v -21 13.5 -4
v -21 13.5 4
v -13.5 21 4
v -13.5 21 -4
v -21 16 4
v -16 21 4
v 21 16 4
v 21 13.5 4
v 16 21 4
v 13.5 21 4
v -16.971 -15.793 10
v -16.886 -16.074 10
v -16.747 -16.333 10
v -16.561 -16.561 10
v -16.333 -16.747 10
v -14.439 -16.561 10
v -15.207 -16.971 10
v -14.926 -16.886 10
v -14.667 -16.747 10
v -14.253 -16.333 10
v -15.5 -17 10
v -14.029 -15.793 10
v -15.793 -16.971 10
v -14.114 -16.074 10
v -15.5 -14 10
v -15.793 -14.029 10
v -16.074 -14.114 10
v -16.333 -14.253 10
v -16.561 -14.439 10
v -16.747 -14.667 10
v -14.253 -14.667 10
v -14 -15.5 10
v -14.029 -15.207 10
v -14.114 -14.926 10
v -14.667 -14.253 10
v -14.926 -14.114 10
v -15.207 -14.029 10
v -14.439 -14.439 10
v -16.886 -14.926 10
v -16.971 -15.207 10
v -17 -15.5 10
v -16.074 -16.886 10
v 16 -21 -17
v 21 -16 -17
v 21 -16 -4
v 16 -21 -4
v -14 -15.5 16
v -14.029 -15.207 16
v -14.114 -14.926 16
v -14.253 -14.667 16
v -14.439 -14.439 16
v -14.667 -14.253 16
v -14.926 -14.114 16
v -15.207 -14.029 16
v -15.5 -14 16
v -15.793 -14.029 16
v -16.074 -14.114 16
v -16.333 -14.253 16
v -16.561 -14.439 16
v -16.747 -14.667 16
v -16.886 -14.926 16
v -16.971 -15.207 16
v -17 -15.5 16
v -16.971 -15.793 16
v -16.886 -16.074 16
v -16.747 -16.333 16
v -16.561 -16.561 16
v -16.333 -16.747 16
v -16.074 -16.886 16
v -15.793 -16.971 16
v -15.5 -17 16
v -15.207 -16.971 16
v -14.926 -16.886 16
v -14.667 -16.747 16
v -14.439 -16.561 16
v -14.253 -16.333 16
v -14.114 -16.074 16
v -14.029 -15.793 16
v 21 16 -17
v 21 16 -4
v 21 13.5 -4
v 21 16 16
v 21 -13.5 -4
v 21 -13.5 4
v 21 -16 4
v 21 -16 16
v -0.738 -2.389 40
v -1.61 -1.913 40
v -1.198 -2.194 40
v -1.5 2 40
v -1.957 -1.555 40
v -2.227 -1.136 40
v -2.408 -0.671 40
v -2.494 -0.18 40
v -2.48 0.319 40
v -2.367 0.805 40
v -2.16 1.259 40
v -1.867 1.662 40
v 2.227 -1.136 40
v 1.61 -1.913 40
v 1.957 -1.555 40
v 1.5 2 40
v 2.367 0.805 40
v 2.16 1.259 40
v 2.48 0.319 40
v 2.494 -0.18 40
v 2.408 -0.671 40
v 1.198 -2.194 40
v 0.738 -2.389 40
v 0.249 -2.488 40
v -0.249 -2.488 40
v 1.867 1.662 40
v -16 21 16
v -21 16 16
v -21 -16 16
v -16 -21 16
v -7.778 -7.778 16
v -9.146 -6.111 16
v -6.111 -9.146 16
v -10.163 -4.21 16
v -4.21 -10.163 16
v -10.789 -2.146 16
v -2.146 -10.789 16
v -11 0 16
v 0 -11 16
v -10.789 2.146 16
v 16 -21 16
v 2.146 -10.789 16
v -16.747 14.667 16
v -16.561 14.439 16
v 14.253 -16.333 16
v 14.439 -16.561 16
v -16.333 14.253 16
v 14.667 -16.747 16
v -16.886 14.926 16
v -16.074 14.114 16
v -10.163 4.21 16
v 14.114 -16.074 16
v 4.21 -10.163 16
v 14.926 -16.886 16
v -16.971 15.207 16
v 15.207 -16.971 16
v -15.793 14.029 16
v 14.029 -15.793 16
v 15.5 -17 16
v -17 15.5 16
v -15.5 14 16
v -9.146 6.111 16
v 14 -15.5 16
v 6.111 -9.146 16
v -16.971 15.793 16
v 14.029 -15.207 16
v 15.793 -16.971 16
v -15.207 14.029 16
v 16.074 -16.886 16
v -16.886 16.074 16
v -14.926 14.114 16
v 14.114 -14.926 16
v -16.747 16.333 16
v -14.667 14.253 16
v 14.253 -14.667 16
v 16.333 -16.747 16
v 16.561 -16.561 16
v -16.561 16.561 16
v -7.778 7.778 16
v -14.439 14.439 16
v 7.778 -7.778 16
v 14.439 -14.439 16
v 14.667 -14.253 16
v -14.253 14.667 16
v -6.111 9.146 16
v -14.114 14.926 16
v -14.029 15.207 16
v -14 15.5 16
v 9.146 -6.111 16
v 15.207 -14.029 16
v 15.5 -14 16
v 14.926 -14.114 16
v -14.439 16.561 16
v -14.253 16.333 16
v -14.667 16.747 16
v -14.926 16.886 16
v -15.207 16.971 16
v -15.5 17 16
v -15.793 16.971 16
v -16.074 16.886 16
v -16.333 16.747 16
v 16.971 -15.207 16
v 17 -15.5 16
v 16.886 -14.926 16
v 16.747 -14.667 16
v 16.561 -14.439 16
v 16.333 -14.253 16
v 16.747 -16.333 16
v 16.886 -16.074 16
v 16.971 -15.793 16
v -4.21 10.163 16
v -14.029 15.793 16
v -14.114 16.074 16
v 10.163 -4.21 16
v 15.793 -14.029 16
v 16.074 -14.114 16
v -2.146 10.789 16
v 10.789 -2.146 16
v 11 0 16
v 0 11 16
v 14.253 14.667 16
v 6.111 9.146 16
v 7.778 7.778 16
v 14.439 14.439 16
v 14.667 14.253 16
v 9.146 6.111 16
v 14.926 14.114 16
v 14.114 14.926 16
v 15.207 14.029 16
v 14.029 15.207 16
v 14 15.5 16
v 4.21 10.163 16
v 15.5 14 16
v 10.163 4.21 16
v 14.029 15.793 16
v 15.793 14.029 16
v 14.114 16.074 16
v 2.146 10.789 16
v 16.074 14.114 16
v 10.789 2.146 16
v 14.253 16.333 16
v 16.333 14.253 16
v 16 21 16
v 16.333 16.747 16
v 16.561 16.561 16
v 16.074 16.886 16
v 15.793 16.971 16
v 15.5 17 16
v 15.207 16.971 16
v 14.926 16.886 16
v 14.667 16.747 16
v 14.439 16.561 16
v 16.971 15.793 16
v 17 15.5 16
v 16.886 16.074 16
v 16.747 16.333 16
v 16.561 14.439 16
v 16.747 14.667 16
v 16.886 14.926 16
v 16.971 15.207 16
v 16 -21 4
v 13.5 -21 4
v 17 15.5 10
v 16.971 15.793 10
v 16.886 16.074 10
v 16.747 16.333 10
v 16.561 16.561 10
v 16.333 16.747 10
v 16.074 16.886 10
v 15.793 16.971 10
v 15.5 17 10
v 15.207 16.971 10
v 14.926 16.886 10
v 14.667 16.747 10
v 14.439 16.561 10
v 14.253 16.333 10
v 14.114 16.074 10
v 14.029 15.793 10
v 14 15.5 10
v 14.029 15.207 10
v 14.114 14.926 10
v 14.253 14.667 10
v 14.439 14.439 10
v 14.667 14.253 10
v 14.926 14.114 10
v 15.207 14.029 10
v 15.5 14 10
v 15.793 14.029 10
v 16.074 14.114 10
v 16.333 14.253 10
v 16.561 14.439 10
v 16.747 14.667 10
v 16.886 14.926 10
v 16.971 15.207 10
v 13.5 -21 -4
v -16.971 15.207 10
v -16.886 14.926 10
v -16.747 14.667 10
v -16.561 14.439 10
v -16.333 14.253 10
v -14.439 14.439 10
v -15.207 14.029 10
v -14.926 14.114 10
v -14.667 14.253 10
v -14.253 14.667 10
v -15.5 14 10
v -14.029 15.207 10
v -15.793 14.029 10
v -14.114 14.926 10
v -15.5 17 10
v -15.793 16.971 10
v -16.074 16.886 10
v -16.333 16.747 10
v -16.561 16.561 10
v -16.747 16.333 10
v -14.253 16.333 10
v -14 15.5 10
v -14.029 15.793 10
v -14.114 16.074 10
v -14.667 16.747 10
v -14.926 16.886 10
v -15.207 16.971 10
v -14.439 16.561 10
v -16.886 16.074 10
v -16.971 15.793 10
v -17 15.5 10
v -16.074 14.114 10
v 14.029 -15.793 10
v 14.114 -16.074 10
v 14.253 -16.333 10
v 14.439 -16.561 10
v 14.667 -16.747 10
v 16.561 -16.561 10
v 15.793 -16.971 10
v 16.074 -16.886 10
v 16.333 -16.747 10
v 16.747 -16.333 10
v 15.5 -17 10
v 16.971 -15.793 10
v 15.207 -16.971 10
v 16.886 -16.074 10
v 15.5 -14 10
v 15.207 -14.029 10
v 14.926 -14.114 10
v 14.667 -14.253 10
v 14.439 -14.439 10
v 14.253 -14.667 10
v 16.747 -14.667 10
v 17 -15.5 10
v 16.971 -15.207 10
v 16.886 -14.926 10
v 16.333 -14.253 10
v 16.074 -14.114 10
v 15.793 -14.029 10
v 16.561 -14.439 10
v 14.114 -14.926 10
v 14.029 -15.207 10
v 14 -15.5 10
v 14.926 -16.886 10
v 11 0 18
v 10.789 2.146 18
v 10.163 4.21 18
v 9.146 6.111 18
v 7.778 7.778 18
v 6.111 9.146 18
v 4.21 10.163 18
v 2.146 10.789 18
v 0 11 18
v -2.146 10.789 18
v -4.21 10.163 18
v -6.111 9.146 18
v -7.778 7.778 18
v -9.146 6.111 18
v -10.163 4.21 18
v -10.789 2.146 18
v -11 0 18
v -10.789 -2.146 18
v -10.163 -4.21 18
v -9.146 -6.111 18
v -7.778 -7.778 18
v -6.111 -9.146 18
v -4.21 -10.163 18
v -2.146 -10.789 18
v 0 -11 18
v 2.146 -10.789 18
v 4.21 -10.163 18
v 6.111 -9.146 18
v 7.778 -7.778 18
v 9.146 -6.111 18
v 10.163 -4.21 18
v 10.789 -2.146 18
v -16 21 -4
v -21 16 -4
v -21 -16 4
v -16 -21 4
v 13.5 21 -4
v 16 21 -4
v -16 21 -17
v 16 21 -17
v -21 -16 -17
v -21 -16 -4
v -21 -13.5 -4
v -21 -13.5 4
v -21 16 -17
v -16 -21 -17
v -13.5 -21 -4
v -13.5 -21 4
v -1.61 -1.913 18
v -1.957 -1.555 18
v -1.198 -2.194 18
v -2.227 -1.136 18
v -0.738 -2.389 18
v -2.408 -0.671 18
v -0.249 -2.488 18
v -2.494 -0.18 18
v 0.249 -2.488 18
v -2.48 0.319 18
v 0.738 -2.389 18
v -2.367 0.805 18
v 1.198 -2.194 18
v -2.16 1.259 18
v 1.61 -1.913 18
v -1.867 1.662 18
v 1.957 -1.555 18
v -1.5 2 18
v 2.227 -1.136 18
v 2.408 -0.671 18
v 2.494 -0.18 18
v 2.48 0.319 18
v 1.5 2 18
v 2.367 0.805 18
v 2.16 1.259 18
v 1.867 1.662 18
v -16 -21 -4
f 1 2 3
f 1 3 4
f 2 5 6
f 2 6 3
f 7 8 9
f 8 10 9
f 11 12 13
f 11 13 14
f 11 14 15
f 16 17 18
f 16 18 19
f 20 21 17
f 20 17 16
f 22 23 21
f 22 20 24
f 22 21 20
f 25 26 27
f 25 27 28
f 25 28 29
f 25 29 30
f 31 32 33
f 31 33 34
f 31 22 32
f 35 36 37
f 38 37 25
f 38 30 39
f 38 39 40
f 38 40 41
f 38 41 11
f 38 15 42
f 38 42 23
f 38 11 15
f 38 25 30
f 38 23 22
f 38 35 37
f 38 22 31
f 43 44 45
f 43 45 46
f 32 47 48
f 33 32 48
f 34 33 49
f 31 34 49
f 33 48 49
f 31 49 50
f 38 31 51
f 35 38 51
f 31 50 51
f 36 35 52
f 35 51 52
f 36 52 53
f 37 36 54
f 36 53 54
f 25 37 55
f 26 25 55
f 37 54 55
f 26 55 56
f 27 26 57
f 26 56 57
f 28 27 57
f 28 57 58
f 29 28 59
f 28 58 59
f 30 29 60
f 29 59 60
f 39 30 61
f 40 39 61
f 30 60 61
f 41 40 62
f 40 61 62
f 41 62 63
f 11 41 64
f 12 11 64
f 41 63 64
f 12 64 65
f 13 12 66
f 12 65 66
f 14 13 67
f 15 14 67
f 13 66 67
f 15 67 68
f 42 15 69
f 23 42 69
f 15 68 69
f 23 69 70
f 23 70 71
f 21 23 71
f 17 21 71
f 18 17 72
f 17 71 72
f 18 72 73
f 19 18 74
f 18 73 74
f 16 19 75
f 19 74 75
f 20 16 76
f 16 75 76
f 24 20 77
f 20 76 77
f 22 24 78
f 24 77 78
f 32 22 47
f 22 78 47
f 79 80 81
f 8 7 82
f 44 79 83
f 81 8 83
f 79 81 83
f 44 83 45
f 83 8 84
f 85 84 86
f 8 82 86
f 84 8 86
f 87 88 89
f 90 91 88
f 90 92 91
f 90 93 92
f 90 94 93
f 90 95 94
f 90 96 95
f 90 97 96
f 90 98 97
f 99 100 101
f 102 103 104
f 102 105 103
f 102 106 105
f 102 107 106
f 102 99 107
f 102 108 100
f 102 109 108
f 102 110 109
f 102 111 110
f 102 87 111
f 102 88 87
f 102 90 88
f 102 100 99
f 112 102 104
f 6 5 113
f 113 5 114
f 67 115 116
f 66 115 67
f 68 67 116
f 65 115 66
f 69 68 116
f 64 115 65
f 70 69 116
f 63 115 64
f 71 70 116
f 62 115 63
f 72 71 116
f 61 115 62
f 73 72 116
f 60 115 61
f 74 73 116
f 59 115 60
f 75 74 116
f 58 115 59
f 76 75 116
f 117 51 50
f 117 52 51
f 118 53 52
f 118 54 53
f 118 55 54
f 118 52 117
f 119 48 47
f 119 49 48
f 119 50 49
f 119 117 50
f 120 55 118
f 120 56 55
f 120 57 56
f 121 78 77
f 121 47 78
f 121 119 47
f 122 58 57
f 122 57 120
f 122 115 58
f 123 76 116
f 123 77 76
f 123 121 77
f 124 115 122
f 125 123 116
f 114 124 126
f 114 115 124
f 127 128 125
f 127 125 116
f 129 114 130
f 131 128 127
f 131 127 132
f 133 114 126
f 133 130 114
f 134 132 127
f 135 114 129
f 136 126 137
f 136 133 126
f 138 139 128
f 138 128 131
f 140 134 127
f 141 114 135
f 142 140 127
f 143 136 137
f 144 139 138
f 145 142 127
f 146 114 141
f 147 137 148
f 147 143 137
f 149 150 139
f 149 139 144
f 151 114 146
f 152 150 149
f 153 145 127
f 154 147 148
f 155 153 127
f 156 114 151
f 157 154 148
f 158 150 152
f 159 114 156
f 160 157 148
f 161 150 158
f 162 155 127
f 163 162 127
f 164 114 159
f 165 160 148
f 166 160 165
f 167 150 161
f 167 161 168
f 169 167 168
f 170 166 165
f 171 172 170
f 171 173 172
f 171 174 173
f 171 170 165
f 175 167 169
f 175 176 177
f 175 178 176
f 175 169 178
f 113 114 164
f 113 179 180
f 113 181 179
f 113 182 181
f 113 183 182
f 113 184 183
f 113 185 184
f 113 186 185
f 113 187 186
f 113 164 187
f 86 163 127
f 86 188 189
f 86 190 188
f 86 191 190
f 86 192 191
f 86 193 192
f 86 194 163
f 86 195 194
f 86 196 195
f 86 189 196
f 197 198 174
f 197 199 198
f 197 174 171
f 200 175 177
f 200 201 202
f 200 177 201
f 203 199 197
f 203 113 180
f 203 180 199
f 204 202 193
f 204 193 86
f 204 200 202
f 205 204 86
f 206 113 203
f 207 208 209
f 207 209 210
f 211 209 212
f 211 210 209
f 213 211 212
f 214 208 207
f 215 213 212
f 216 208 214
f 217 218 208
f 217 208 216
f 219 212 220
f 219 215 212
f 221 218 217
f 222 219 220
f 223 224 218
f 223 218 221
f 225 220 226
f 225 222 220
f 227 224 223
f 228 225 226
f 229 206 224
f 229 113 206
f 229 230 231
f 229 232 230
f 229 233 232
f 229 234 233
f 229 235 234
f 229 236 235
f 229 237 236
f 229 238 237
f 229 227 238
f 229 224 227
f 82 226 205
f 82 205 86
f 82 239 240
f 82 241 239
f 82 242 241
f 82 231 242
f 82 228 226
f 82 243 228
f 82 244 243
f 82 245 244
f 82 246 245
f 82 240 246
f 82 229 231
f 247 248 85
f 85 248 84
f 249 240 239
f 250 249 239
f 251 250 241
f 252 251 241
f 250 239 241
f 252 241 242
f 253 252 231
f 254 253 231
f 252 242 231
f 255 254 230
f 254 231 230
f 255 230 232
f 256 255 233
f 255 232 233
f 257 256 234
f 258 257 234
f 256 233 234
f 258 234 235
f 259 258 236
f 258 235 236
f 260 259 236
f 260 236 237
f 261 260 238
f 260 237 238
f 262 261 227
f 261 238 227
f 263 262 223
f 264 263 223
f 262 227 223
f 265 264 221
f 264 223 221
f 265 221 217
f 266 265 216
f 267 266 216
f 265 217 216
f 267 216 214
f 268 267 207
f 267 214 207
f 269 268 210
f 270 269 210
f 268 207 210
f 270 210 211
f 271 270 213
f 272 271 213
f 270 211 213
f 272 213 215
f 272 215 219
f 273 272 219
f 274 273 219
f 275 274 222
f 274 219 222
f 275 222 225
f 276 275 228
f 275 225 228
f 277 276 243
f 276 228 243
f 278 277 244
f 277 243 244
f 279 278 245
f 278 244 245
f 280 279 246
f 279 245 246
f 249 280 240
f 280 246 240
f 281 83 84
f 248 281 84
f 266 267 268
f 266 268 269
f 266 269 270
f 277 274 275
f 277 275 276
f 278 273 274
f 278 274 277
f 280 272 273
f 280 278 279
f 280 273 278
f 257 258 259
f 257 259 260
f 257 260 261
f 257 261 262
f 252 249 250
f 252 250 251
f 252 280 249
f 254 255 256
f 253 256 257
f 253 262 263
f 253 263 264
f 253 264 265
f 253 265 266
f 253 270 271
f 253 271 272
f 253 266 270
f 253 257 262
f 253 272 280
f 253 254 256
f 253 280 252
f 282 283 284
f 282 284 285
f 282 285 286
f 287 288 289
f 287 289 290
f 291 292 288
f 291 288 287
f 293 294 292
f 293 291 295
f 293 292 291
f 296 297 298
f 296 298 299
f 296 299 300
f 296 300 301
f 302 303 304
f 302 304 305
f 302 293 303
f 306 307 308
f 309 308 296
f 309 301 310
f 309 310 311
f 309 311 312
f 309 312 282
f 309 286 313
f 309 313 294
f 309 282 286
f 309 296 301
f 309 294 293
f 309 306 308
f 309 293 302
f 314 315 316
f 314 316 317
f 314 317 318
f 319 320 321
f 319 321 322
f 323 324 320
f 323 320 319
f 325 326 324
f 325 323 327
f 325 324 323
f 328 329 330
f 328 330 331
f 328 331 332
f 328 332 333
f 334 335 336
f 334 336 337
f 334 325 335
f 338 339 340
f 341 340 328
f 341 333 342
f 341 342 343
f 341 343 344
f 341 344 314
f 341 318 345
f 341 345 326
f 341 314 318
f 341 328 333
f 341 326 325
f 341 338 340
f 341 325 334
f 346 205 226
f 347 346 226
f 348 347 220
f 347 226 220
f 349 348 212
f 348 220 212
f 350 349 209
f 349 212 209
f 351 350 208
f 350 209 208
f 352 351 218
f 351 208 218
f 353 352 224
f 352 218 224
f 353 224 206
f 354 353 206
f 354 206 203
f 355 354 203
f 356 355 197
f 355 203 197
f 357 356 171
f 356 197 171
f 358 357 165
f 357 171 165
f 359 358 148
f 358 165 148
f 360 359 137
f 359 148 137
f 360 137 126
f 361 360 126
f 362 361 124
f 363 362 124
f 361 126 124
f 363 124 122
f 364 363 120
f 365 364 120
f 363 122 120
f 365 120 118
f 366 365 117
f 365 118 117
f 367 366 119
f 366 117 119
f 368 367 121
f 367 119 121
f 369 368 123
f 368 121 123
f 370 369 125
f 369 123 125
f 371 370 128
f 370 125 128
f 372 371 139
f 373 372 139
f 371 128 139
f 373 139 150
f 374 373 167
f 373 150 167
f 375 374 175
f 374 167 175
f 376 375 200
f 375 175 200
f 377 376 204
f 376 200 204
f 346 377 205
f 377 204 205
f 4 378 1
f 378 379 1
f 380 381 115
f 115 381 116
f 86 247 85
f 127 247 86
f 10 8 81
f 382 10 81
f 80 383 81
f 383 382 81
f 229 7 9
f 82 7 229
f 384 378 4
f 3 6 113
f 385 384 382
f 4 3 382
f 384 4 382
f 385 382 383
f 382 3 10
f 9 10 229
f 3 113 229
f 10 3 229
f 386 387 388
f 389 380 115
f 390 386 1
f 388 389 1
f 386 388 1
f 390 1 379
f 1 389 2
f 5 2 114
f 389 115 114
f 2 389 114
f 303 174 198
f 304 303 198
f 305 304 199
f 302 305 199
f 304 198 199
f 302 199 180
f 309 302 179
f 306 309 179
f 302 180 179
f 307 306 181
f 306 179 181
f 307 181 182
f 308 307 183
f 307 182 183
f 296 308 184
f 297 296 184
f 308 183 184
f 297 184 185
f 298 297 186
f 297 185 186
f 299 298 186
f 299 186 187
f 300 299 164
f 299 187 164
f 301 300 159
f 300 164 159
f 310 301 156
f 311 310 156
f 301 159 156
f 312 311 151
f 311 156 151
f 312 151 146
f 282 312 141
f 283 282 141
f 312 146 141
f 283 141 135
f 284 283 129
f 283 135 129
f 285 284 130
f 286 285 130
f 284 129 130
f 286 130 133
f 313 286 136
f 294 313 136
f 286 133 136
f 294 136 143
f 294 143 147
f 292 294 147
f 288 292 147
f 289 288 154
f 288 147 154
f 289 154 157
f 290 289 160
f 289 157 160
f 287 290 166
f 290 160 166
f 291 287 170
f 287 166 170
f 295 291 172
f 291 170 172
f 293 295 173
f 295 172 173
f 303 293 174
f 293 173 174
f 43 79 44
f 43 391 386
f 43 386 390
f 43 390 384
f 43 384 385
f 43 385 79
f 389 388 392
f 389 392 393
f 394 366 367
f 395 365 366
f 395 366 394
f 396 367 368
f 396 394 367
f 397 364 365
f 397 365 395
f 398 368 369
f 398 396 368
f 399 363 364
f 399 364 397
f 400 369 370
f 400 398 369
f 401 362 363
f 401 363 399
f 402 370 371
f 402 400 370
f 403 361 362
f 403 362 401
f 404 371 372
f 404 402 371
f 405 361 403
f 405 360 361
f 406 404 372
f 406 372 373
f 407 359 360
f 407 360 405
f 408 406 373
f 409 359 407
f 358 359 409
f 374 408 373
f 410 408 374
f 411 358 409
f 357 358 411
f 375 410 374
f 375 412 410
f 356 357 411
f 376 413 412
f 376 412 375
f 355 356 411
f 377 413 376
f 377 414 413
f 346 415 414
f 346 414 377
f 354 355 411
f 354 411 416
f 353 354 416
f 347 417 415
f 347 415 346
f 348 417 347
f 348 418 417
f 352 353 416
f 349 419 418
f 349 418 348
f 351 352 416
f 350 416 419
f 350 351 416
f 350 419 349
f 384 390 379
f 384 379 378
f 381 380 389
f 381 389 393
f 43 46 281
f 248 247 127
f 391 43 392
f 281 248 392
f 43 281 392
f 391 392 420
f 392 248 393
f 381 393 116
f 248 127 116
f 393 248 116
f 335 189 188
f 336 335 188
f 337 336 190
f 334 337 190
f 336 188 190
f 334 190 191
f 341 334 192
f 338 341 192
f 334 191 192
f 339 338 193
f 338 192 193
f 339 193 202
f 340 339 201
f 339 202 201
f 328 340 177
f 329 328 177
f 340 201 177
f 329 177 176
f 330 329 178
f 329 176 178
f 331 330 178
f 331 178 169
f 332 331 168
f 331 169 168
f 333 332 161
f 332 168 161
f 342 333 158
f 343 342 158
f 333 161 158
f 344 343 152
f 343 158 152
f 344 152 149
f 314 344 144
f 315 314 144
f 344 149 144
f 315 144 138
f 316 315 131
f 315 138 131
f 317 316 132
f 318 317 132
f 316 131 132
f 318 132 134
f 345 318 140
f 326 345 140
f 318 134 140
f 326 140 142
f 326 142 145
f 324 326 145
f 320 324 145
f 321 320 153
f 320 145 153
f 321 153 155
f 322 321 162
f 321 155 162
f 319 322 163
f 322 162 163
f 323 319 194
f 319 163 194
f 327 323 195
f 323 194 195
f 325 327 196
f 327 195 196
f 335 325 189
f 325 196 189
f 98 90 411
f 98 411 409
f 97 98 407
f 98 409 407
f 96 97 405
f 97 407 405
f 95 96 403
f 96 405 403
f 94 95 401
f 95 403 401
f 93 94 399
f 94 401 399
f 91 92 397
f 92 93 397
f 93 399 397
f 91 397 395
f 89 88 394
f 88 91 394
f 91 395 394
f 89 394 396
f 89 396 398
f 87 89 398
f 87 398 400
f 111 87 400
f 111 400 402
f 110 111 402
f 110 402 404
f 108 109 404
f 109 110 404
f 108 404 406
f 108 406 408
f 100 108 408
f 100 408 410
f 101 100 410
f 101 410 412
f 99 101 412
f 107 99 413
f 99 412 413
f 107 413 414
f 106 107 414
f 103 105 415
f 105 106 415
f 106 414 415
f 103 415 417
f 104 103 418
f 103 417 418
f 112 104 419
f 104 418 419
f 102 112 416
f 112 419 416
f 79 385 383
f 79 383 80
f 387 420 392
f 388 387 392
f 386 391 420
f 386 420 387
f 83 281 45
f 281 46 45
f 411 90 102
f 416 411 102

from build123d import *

# Parameters (mm, degrees)
F0_W      = 42
F0_H      = 42
F1_DEPTH  = 4
F2_SIZE   = 7.5
F4_DEPTH  = 12
F5_SIZE   = 5
F7_DEPTH  = 13
F8_R      = 11
F9_DEPTH  = 2
F10_R     = 2.5
F11_DEPTH = 22
F12_W     = 5.2537292178
F12_H     = 0.9334036984
F13_DEPTH = 22
F14_R     = 1.5
F15_DEPTH = 6


with BuildPart() as f1:
    # F0 (on Top) → F1 (new body, symmetric)
    with BuildSketch(Plane.XY):
        Rectangle(F0_W, F0_H)
    extrude(amount=F1_DEPTH, both=True)

    # F2
    f2_edges = [f1.edges().sort_by_distance(p)[0] for p in [
        (21, 21, 0),
        (-21, 21, 0),
        (-21, -21, 0),
        (21, -21, 0),
    ]]
    chamfer(f2_edges, length=F2_SIZE)

    # F3 (on face) → F4 (join)
    with BuildSketch(Plane.XY.offset(4)):
        Polygon((13.5, 21), (-13.5, 21), (-21, 13.5), (-21, -13.5), (-13.5, -21), (13.5, -21), (21, -13.5), (21, 13.5), align=None)
        Polygon((21, 21), (13.5, 21), (21, 13.5), align=None)
        Polygon((-13.5, 21), (-21, 21), (-21, 13.5), align=None)
        Polygon((-13.5, -21), (-21, -13.5), (-21, -21), align=None)
        Polygon((21, -21), (21, -13.5), (13.5, -21), align=None)
    extrude(amount=F4_DEPTH)

    # F5
    f5_edges = [f1.edges().sort_by_distance(p)[0] for p in [
        (21, -21, 10),
        (-21, -21, 10),
        (-21, 21, 10),
        (21, 21, 10),
    ]]
    chamfer(f5_edges, length=F5_SIZE)

    # F6 (on face) → F7 (join)
    with BuildSketch(Plane(origin=(0, 0, -4), x_dir=(1, 0, 0), z_dir=(0, 0, -1))):
        Polygon((21, -16), (21, 16), (16, 21), (-16, 21), (-21, 16), (-21, -16), (-16, -21), (16, -21), align=None)
    extrude(amount=F7_DEPTH)

    # F8 (on face) → F9 (join)
    with BuildSketch(Plane.XY.offset(16)):
        Circle(F8_R)
    extrude(amount=F9_DEPTH)

    # F10 (on face) → F11 (join)
    with BuildSketch(Plane.XY.offset(18)):
        Circle(F10_R)
    extrude(amount=F11_DEPTH)

    # F12 (on face) → F13 (cut)
    with BuildSketch(Plane.XY.offset(40)):
        with Locations((-0.0065014465, 2.4667018492)):
            Rectangle(F12_W, F12_H)
    extrude(amount=-F13_DEPTH, mode=Mode.SUBTRACT)

    # F14 (on face) → F15 (cut)
    with BuildSketch(Plane.XY.offset(16)):
        with Locations((-15.5, 15.5)):
            Circle(F14_R)
        with Locations((15.5, 15.5)):
            Circle(F14_R)
        with Locations((-15.5, -15.5)):
            Circle(F14_R)
        with Locations((15.5, -15.5)):
            Circle(F14_R)
    extrude(amount=-F15_DEPTH, mode=Mode.SUBTRACT)


solid = f1.part
